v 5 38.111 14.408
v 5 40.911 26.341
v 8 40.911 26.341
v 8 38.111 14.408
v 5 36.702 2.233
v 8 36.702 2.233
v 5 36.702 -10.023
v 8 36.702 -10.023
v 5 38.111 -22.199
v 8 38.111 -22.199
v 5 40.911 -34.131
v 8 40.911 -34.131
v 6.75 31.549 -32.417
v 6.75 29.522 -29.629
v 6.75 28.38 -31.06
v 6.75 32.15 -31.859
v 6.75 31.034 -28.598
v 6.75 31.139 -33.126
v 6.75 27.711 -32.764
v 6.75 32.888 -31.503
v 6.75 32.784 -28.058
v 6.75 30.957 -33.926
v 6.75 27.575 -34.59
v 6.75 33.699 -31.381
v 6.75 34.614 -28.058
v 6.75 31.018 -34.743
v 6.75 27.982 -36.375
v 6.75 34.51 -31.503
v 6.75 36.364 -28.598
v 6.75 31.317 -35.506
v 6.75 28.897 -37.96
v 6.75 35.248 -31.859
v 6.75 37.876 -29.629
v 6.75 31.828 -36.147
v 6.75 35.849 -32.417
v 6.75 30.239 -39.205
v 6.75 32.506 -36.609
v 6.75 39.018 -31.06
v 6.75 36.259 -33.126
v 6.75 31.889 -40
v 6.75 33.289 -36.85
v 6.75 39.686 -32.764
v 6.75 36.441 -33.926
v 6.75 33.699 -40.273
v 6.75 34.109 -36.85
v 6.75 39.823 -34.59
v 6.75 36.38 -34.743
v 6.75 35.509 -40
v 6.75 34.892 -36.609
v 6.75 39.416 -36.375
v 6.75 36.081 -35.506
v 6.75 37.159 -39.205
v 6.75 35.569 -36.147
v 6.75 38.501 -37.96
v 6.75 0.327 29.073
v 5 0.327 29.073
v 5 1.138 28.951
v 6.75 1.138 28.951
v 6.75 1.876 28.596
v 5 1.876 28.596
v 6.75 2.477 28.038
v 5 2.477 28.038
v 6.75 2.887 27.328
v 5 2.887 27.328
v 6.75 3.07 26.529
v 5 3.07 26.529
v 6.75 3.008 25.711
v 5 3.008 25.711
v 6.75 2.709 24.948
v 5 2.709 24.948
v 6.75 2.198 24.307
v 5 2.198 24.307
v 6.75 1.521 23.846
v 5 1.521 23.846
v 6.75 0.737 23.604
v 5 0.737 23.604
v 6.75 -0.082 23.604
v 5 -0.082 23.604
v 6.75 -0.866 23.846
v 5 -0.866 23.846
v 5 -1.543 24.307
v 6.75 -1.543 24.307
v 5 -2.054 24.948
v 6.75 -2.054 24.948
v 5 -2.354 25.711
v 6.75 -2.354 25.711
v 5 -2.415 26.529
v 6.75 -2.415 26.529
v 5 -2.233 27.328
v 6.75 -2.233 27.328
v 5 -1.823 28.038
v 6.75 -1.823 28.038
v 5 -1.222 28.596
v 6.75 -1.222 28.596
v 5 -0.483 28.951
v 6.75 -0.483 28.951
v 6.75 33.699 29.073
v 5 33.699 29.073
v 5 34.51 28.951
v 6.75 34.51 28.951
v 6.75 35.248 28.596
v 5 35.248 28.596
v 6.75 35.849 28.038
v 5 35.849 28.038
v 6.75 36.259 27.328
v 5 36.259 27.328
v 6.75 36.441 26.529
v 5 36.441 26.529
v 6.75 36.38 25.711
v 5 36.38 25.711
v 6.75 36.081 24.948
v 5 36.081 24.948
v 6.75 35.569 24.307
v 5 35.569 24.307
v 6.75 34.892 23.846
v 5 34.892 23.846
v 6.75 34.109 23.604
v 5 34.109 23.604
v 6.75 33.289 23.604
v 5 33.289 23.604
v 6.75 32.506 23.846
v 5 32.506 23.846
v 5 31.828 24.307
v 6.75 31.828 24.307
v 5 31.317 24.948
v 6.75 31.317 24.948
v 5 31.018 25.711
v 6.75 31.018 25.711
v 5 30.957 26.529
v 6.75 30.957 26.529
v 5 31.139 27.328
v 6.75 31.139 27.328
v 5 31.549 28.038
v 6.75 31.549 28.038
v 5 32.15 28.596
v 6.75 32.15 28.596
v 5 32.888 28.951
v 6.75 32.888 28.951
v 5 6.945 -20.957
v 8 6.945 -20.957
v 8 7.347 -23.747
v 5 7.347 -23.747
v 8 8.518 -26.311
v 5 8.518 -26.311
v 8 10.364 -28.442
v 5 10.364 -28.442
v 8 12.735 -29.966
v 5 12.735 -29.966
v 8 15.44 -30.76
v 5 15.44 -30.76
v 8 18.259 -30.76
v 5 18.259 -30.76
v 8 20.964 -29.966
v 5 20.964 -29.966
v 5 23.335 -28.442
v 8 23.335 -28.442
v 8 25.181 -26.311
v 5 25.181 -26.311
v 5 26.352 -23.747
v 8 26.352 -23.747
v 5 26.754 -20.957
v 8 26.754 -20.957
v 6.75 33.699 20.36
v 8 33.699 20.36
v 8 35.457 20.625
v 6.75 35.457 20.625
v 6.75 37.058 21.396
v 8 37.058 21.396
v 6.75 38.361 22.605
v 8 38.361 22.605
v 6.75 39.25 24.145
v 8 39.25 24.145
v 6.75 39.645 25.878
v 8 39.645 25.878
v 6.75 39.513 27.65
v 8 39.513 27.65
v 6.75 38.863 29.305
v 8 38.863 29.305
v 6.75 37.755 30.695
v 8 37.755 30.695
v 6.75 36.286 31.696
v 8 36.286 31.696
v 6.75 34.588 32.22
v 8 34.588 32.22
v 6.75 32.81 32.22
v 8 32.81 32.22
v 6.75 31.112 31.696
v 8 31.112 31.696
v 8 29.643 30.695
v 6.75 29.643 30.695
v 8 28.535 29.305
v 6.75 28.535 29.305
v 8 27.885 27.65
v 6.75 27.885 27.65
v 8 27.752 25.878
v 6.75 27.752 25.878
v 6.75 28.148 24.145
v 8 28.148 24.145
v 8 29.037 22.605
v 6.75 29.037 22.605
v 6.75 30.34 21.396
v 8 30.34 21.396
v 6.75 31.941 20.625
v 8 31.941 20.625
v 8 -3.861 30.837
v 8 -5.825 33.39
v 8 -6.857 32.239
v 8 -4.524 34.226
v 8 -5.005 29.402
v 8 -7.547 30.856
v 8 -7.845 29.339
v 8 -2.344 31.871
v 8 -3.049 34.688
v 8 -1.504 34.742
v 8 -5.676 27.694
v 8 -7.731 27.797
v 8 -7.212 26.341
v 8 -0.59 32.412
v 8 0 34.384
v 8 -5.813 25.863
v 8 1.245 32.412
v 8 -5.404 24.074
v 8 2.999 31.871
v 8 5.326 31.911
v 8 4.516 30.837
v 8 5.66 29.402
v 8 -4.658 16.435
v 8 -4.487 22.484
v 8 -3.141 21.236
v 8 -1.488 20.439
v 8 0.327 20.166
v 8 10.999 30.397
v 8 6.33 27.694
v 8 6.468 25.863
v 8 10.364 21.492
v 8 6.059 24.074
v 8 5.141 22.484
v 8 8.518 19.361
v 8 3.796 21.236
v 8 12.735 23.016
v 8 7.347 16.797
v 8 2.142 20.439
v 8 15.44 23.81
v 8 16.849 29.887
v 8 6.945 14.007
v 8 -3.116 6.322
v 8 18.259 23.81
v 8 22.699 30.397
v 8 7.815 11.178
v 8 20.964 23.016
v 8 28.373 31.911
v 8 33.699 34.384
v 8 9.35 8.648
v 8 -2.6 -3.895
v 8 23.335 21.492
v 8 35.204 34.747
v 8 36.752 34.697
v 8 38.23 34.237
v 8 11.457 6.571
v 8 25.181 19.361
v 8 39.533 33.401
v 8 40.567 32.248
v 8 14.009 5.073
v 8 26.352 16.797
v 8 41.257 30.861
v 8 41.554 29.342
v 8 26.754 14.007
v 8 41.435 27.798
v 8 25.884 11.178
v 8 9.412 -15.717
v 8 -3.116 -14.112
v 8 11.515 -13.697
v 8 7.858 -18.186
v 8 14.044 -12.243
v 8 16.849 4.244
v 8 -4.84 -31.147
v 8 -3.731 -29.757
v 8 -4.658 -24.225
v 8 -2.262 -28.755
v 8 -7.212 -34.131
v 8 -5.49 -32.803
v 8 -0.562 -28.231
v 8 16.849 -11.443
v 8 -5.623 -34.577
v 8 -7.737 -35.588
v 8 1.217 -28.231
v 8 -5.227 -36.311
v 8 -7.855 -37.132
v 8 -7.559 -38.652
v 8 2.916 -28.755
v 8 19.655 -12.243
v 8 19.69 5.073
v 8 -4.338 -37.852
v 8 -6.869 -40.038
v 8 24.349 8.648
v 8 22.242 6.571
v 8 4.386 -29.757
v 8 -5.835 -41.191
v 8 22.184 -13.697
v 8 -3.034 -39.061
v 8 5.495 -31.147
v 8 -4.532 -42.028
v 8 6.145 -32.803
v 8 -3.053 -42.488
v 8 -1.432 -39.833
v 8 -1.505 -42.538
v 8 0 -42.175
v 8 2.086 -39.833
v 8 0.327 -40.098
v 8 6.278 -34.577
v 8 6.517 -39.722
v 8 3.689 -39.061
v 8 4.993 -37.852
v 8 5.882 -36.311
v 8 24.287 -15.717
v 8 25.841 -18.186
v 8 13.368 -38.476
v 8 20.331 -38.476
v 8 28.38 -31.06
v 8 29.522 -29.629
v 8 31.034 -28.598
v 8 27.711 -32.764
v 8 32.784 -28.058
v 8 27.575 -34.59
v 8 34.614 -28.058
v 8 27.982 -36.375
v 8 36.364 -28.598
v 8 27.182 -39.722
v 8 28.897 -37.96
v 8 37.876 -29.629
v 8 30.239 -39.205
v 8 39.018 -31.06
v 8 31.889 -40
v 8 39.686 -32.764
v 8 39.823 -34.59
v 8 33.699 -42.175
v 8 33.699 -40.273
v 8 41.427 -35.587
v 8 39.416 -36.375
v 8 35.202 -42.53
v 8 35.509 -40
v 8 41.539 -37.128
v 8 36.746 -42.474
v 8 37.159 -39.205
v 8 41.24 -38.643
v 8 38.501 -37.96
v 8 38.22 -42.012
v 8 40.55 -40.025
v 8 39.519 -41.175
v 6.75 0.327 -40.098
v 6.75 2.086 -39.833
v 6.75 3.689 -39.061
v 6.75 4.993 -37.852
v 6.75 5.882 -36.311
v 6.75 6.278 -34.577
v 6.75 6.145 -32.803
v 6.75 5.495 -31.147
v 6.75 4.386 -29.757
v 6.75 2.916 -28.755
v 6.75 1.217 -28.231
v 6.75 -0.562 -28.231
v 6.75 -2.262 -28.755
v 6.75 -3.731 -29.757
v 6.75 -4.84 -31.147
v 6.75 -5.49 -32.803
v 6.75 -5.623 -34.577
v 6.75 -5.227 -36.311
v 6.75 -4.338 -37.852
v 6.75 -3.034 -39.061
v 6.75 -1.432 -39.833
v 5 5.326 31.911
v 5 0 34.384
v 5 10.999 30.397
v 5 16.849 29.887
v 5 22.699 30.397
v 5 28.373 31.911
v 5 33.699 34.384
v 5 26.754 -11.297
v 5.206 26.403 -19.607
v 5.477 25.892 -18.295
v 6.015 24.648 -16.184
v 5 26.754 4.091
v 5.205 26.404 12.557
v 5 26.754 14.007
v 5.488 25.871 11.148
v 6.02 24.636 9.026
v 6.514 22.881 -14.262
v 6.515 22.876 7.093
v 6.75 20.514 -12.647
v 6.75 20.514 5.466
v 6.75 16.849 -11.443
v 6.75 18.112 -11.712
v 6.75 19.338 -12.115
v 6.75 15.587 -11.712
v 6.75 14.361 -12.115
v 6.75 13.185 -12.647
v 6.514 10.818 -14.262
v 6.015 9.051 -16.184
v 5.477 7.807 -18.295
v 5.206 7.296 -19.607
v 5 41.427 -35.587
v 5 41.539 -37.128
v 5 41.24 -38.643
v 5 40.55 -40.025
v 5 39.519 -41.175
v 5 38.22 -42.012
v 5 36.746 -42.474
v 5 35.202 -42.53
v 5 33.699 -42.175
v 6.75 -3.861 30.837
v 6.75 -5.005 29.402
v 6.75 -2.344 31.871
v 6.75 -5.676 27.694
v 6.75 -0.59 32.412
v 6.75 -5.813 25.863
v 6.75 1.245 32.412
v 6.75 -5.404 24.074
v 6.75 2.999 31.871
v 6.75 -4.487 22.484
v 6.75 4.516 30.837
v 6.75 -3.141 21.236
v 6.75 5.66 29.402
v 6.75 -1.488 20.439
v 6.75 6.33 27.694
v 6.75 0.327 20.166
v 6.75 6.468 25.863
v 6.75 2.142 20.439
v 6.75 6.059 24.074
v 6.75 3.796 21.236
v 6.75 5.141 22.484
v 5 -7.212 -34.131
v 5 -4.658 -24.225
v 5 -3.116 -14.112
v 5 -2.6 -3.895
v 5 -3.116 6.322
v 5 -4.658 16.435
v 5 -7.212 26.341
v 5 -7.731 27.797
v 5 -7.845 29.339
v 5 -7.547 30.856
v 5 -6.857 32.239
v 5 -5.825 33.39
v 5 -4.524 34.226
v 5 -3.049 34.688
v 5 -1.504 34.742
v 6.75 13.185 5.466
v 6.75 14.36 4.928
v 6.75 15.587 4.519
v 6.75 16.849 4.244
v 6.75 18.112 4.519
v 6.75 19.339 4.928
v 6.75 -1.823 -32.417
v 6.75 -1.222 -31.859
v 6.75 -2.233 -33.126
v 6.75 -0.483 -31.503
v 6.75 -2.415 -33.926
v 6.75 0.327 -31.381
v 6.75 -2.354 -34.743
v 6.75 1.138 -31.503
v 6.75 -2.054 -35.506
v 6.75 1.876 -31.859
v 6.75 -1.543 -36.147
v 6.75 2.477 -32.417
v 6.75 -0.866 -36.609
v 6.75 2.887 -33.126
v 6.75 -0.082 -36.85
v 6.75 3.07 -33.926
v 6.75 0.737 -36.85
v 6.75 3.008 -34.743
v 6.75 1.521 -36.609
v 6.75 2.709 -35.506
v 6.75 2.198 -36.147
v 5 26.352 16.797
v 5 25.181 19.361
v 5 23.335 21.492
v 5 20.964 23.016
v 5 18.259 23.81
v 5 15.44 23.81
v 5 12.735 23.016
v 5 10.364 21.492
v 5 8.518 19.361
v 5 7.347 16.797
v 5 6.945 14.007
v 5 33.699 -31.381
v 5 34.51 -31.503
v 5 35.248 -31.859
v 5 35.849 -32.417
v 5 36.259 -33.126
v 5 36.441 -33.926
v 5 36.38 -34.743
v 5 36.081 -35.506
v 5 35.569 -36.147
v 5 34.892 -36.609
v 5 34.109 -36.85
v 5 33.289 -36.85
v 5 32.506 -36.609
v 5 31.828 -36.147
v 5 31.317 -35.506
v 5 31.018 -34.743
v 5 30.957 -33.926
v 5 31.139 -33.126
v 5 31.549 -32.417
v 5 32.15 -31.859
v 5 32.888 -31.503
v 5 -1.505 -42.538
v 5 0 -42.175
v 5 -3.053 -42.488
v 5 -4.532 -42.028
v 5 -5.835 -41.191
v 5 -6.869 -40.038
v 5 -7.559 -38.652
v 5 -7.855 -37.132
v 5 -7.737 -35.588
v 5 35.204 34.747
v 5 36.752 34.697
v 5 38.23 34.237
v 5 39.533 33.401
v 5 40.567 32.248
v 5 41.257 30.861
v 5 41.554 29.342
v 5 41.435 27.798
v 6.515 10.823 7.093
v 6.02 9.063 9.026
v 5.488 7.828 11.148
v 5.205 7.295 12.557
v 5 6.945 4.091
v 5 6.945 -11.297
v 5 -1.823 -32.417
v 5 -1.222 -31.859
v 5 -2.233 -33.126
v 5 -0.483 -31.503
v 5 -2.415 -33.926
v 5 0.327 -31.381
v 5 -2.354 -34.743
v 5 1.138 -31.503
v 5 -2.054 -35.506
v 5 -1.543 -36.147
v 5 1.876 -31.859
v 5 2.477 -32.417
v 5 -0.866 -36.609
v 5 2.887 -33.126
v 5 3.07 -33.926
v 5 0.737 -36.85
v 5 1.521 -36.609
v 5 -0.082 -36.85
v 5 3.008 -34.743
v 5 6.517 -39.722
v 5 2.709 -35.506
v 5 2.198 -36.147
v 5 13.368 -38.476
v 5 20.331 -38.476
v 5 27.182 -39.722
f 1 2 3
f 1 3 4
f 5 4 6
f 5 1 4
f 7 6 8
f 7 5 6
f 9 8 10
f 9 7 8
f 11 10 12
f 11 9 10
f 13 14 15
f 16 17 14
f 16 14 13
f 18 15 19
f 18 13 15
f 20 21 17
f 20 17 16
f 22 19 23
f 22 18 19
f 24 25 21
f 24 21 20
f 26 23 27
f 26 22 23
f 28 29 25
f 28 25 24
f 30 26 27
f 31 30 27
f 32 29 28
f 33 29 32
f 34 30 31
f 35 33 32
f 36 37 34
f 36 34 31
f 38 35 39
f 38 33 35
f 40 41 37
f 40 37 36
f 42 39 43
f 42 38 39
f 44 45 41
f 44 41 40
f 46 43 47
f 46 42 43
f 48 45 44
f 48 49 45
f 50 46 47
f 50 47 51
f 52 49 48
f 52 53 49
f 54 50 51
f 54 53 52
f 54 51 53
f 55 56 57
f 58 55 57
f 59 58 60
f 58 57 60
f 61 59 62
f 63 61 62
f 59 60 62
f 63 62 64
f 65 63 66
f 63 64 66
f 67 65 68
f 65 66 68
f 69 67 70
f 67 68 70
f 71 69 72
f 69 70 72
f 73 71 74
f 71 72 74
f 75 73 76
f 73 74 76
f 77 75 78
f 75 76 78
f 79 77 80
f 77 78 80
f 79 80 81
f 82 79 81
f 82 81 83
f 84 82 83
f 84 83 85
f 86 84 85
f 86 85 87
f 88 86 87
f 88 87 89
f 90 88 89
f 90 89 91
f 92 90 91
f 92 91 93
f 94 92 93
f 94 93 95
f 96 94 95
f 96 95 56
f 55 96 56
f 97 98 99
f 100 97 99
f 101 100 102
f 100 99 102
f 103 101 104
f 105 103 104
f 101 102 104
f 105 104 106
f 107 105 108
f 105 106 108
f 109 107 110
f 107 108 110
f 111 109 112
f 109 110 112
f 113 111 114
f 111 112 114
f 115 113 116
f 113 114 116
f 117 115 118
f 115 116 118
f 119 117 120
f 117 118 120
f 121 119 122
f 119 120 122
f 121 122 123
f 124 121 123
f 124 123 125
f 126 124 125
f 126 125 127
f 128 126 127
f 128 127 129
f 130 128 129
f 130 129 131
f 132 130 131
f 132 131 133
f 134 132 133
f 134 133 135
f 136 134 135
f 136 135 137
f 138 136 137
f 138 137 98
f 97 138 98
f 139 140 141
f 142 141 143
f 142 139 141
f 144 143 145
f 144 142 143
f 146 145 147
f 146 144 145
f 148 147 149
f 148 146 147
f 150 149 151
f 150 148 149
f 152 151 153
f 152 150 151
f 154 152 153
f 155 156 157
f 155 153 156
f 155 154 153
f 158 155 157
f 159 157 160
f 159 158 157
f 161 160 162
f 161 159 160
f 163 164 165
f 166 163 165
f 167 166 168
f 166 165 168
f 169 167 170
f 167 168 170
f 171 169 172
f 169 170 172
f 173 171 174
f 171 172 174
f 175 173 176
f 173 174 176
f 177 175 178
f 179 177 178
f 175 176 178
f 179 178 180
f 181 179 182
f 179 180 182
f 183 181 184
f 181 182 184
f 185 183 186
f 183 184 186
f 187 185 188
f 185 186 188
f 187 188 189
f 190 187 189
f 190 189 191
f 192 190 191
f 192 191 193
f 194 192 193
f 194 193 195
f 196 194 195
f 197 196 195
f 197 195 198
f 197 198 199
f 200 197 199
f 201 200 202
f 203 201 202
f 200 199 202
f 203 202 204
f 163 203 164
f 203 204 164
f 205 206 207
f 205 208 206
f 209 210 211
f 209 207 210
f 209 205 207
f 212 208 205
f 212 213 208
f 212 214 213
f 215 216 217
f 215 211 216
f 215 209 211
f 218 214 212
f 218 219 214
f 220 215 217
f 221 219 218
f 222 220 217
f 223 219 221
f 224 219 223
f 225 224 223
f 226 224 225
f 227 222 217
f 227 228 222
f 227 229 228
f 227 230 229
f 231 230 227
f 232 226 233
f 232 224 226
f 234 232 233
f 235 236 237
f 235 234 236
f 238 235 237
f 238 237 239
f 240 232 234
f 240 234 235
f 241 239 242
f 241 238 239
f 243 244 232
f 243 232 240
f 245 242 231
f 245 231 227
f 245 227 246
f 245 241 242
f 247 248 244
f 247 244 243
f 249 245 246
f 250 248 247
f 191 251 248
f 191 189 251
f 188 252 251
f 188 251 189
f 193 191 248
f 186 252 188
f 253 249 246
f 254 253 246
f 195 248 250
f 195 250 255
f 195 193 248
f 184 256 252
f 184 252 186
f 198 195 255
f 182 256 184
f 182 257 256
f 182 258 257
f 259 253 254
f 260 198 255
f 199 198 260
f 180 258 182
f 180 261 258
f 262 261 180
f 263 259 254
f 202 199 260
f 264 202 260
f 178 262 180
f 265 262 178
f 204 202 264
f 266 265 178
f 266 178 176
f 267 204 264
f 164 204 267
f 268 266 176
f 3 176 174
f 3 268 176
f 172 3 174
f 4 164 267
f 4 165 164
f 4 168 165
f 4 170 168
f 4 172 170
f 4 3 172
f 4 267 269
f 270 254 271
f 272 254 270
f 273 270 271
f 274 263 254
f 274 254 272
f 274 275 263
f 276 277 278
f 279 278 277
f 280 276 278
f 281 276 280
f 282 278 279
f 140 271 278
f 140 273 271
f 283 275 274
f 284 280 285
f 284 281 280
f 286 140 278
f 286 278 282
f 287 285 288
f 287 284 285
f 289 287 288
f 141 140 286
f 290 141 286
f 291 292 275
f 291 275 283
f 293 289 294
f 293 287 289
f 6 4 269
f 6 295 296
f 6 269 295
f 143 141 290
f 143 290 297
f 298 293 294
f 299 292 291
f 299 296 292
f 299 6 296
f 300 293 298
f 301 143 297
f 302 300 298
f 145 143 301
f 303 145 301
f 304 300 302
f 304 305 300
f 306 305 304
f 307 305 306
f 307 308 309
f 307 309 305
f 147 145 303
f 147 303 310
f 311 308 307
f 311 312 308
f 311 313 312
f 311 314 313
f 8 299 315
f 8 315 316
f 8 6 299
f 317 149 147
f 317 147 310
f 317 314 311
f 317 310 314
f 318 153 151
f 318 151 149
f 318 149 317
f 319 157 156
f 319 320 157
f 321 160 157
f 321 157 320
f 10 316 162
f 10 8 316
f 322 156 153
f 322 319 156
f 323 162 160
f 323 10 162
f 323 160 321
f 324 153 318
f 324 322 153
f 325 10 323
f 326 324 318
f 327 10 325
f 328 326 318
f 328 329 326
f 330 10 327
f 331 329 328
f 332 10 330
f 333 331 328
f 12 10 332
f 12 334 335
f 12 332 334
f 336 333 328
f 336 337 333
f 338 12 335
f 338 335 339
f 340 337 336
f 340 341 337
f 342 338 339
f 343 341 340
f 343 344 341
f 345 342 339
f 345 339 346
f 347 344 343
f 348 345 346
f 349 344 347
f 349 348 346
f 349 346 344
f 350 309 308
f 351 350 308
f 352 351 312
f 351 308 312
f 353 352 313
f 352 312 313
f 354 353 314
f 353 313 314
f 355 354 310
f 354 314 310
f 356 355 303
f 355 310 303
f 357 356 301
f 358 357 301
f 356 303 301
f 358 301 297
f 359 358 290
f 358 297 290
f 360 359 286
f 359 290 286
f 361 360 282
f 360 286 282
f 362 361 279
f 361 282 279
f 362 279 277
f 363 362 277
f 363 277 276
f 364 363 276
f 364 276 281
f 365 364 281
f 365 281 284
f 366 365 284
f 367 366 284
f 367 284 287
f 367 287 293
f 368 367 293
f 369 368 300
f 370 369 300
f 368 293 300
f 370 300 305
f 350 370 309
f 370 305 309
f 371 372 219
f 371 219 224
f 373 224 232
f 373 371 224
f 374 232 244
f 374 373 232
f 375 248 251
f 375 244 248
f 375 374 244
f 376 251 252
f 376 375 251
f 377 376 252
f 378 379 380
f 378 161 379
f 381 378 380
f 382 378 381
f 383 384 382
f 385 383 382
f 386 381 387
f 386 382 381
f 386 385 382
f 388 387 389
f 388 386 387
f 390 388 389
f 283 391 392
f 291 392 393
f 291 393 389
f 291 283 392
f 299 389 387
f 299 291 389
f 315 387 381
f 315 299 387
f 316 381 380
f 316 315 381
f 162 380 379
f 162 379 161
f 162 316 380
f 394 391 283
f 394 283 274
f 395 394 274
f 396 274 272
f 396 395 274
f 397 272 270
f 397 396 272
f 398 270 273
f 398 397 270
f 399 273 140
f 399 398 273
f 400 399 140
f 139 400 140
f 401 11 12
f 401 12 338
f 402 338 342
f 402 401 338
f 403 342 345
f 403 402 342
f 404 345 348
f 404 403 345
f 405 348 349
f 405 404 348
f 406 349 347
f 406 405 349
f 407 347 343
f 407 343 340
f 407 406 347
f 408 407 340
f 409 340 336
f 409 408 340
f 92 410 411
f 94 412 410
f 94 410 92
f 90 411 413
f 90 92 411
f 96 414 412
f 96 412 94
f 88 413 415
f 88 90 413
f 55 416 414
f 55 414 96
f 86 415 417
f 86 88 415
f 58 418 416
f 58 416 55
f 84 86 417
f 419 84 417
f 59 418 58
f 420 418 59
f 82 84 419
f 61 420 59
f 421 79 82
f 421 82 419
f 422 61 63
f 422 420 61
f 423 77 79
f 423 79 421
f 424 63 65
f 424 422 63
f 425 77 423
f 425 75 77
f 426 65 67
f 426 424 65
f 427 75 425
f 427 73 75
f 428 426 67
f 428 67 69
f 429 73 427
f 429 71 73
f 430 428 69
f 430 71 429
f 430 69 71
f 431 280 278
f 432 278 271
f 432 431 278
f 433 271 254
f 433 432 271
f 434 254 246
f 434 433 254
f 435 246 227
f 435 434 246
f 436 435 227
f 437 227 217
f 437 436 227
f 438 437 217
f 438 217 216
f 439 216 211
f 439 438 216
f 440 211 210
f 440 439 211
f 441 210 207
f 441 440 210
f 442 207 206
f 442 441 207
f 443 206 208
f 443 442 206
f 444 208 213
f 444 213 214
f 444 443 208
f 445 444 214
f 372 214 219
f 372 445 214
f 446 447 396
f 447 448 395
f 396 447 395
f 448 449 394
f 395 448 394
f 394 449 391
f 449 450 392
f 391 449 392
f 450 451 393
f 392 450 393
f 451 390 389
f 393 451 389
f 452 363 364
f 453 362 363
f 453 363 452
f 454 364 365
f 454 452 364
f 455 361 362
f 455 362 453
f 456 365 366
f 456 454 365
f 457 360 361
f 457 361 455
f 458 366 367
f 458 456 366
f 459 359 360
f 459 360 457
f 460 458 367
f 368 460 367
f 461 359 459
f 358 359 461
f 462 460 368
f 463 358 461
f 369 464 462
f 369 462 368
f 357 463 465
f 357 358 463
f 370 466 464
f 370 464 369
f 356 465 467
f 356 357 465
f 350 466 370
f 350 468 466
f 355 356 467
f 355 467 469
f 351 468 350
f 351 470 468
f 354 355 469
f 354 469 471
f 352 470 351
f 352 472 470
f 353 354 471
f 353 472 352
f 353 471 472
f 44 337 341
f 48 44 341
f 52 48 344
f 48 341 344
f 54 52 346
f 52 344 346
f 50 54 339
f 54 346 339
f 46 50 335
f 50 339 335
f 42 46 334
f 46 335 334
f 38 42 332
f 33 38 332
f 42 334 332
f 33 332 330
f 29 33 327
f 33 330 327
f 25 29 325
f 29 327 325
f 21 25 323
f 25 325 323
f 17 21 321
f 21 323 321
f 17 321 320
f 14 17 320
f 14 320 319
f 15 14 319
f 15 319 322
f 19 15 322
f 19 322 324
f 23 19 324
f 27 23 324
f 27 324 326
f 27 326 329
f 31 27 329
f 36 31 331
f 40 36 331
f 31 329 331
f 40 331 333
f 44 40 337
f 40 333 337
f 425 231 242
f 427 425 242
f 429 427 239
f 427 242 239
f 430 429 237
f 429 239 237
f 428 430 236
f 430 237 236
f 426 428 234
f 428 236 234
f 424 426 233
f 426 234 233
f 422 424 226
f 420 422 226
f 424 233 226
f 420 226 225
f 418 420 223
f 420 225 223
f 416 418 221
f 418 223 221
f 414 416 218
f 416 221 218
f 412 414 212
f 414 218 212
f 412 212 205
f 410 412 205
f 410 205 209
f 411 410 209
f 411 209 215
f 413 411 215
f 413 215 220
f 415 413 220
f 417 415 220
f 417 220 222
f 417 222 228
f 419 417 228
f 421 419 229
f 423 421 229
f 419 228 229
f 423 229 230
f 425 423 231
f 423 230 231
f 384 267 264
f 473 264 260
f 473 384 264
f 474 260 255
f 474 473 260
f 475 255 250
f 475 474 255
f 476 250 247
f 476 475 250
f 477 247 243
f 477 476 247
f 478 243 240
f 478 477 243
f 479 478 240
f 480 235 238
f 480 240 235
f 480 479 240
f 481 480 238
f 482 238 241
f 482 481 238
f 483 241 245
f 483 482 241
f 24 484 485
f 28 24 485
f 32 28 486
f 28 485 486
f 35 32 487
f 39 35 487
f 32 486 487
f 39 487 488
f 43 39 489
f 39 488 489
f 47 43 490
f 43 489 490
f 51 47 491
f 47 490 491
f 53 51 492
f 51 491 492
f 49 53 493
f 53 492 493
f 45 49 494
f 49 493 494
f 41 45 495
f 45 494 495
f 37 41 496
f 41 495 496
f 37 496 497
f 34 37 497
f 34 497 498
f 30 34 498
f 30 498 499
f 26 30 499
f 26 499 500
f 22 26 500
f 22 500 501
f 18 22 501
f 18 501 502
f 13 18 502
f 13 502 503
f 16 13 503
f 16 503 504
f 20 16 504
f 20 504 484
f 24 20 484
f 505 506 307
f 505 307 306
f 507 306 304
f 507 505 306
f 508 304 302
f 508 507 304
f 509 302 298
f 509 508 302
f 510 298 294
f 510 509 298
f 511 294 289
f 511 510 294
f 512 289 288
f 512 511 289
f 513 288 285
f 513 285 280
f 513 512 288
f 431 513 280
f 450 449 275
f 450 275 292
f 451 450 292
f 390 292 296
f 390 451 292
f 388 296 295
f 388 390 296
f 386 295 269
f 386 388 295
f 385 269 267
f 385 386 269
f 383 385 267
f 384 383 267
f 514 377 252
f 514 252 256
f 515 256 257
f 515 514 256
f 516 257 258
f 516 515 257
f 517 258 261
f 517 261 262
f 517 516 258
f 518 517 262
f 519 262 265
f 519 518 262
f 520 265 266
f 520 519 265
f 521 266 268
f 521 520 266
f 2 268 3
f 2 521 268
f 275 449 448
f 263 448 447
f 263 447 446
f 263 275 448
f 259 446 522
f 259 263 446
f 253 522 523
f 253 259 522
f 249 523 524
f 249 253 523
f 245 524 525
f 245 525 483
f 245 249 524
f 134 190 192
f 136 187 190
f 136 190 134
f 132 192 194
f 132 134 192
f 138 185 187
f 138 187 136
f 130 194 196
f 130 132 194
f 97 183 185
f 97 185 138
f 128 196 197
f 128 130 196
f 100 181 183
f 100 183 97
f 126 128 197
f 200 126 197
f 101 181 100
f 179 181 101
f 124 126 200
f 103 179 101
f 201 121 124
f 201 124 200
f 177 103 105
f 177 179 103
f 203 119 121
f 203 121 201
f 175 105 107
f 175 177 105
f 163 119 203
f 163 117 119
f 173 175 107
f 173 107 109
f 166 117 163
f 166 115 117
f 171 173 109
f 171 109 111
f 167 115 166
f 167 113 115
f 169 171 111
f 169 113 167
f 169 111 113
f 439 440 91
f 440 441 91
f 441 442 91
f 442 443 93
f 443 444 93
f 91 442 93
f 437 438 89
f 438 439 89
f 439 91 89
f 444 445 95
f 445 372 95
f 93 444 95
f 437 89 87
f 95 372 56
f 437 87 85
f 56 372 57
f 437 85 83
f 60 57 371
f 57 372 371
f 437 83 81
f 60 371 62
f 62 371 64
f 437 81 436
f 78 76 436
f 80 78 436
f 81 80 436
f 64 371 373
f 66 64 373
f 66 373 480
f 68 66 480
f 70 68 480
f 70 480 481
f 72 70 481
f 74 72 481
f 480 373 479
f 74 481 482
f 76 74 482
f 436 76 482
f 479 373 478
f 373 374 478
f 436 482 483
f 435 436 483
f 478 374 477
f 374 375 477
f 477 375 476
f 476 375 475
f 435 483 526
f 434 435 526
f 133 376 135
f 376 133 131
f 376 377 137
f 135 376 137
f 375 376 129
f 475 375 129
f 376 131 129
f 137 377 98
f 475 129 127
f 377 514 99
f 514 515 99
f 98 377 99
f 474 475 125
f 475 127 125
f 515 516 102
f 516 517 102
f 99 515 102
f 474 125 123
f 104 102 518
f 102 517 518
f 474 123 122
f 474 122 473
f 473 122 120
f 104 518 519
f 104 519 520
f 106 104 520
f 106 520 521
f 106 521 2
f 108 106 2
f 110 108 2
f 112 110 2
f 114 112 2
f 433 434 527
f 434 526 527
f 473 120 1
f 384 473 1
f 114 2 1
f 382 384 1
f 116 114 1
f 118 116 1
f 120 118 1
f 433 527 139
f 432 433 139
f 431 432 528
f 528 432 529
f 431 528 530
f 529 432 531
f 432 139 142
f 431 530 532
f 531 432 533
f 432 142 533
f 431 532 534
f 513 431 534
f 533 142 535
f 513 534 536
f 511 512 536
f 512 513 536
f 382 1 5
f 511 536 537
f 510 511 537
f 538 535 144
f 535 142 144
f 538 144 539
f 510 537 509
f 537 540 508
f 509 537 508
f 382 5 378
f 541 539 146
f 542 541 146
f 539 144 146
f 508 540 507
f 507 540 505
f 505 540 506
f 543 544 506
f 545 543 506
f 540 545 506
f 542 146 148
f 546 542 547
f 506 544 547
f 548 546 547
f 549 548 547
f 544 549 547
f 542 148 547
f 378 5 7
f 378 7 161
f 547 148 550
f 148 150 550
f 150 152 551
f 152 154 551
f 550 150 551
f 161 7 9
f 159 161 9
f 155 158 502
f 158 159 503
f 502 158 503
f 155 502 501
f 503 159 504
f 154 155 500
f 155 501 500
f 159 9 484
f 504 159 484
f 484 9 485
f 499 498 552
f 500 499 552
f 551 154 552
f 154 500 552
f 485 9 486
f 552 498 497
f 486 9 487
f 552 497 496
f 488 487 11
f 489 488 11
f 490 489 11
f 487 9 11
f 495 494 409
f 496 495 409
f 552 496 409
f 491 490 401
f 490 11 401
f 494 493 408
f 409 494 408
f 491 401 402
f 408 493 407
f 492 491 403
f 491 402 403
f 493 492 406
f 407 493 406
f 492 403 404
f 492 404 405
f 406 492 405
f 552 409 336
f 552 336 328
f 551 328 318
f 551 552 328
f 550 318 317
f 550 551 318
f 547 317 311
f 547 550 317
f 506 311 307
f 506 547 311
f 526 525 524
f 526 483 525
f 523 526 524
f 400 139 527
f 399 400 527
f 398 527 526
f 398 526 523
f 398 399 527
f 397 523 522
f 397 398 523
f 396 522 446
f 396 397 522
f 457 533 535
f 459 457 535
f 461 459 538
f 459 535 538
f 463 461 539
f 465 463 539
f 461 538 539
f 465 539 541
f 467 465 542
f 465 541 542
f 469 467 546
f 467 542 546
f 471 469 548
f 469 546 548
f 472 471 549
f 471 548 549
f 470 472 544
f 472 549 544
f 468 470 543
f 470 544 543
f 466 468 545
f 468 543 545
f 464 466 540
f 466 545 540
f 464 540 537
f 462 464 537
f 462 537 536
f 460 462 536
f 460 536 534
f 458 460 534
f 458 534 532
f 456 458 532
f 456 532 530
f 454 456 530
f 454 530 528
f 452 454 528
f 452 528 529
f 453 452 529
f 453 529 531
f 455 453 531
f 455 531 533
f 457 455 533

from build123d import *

# Parameters (mm, degrees)
SKETCH_1_W          = 87
SKETCH_1_H          = 63
SKETCH_1_W_2        = 83
SKETCH_1_H_2        = 59
EXTRUDE_1_DEPTH     = 5
SKETCH_2_W          = 87
SKETCH_2_H          = 63
EXTRUDE_2_DEPTH     = 3
SKETCH_3_W          = 2.764626384
SKETCH_3_H          = 4.6515936
CUT_EXTRUDE_1_DEPTH = 2
FILLET_1_R          = 2
SKETCH_5_R          = 2.75
CUT_EXTRUDE_2_DEPTH = 10
SKETCH_6_OUTSIDE_W  = 110.542
SKETCH_6_OUTSIDE_H  = 86.542
CUT_EXTRUDE_3_DEPTH = 10
SKETCH_7_W          = 10.763963746
SKETCH_7_H          = 73.165580881
CUT_EXTRUDE_4_DEPTH = 125
SKETCH_8_R          = 5.963187944
SKETCH_8_R_2        = 6.141451549
SKETCH_8_R_3        = 6.157472201
SKETCH_8_R_4        = 5.967235868
CUT_EXTRUDE_5_DEPTH = 1.25
SKETCH_9_W          = 15.387789175
SKETCH_9_H          = 31.944271198
EXTRUDE_4_DEPTH     = 1.25
FILLET_2_R          = 12


with BuildPart() as part:
    # 草图1 → 凸台-拉伸1 (new body)
    with BuildSketch(Plane(origin=(0, 0, 0), x_dir=(0, 0, -1), z_dir=(1, 0, 0))):
        with Locations((3.90387463, 17.013155975)):
            Rectangle(SKETCH_1_W, SKETCH_1_H)
        with Locations((3.90387463, 17.013155975)):
            Rectangle(SKETCH_1_W_2, SKETCH_1_H_2, mode=Mode.SUBTRACT)
    extrude(amount=EXTRUDE_1_DEPTH)

    # 草图2 → 凸台-拉伸2 (add)
    with BuildSketch(Plane(origin=(5, 0, 0), x_dir=(0, 0, -1), z_dir=(1, 0, 0))):
        with Locations((3.90387463, 17.013155975)):
            Rectangle(SKETCH_2_W, SKETCH_2_H)
    extrude(amount=EXTRUDE_2_DEPTH)

    # 草图3 → 切除-拉伸1 (cut)
    with BuildSketch(Plane(origin=(0, 0, -47.40387463), x_dir=(-1, 0, 0), z_dir=(0, 0, -1))):
        with Locations((-3.662779601, -6.806448474)):
            Rectangle(SKETCH_3_W, SKETCH_3_H)
    extrude(amount=-CUT_EXTRUDE_1_DEPTH, mode=Mode.SUBTRACT)

    # 圆角1
    fillet_1_edges = [part.edges().sort_by_distance(p)[0] for p in [
        (8, 17.013155975, 39.59612537),
        (8, -14.486844025, -3.90387463),
        (8, 17.013155975, -47.40387463),
        (8, 48.513155975, -3.90387463),
        (4, 48.513155975, 39.59612537),
        (4, 48.513155975, -47.40387463),
        (4, -14.486844025, -47.40387463),
        (4, -14.486844025, 39.59612537),
    ]]
    fillet(fillet_1_edges, radius=FILLET_1_R)

    # 草图5 → 切除-拉伸2 (cut)
    with BuildSketch(Plane.ZY.offset(-5)):
        with Locations((-34.13110136, 33.698944985)):
            Circle(SKETCH_5_R)
        with Locations((26.3233521, 33.698944985)):
            Circle(SKETCH_5_R)
        with Locations((-34.13110136, 0.327366965)):
            Circle(SKETCH_5_R)
        with Locations((26.3233521, 0.327366965)):
            Circle(SKETCH_5_R)
    extrude(amount=-CUT_EXTRUDE_2_DEPTH, mode=Mode.SUBTRACT)

    # 草图6 outside → 切除-拉伸3 (cut)
    # profile 1 of 2: a face of its own
    with BuildSketch(Plane.ZY.offset(-5)):
        with Locations((-3.904, 17.013)):
            Rectangle(SKETCH_6_OUTSIDE_W, SKETCH_6_OUTSIDE_H)
        with BuildLine():
            ThreePointArc((-42.174874453, 33.698944985), (-38.319014018, 16.849472493), (-42.174874453, 0))
            ThreePointArc((-42.174874453, 0), (-40.649791206, -6.390726624), (-34.13110136, -7.211670209))
            ThreePointArc((-34.13110136, -7.211670209), (-3.895194581, -2.599840712), (26.340712199, -7.211670209))
            ThreePointArc((26.340712199, -7.211670209), (32.84921876, -6.379368362), (34.384485291, 0))
            ThreePointArc((34.384485291, 0), (29.88694456, 16.849472493), (34.384485291, 33.698944985))
            ThreePointArc((34.384485291, 33.698944985), (32.858946784, 40.089163818), (26.340712199, 40.910615194))
            ThreePointArc((26.340712199, 40.910615194), (-3.895194581, 36.525010702), (-34.13110136, 40.910615194))
            ThreePointArc((-34.13110136, 40.910615194), (-40.634931957, 40.073097857), (-42.174874453, 33.698944985))
        make_face(mode=Mode.SUBTRACT)
    # profile 2 of 2: a face of its own
    with BuildSketch(Plane.ZY.offset(-5)):
        with BuildLine():
            Line((-20.956673586, 26.753574551), (14.00692679, 26.753574551))
            ThreePointArc((14.00692679, 26.753574551), (23.911028849, 16.849472493), (14.00692679, 6.945370434))
            Line((14.00692679, 6.945370434), (-20.956673586, 6.945370434))
            ThreePointArc((-20.956673586, 6.945370434), (-30.860775645, 16.849472493), (-20.956673586, 26.753574551))
        make_face()
    extrude(amount=-CUT_EXTRUDE_3_DEPTH, mode=Mode.SUBTRACT)


with BuildPart() as cut_extrude_3_piece_1:
    # of the separate pieces the step leaves, piece 1, a body of its own (cut_extrude_3_pieces)
    add(part.part.solids().sort_by_distance((5, 33.698944985, 34.384485291))[0])

    # 草图8 → 切除-拉伸5 (cut)
    with BuildSketch(Plane(origin=(8, 0, 0), x_dir=(0, 0, -1), z_dir=(1, 0, 0))):
        with Locations((-26.3233521, 33.698944985)):
            Circle(SKETCH_8_R)
        with Locations((34.13110136, 33.698944985)):
            Circle(SKETCH_8_R_2)
        with Locations((-26.3233521, 0.327366965)):
            Circle(SKETCH_8_R_3)
        with Locations((34.13110136, 0.327366965)):
            Circle(SKETCH_8_R_4)
    extrude(amount=-CUT_EXTRUDE_5_DEPTH, mode=Mode.SUBTRACT)

    # 草图9 → 凸台-拉伸4 (add)
    with BuildSketch(Plane(origin=(8, 0, 0), x_dir=(0, 0, -1), z_dir=(1, 0, 0))):
        with Locations((3.60318744, 17.051189704)):
            Rectangle(SKETCH_9_W, SKETCH_9_H)
    extrude(amount=-EXTRUDE_4_DEPTH)

    # 圆角2
    # the kernel refuses this fillet: 12 mm, written as the material it adds along each edge
    with BuildSketch(Plane(origin=(6.75, 26.753574551, 4.090707148), x_dir=(-1, 0, 0), z_dir=(0, 0, -1)), Plane(origin=(6.75, 6.945370434, -11.297082027), x_dir=(-1, 0, 0), z_dir=(0, 0, 1))) as fillet_2_piece_1:
        with BuildLine():
            CenterArc((12, -6.239991987), FILLET_2_R, 148.667793293, 31.332206707)
            Line((0, -6.239991987), (-0.24, -6.239991987))
            Line((-0.24, -6.239991987), (-0.24, 0))
            Line((-0.24, 0), (0, 0.24))
            ThreePointArc((0, 0.24), (0.875, 0.24), (1.545, 0.12479984))
            Line((1.545, 0.12479984), (1.75, 0))
        make_face()
    extrude(amount=15.387789175)
    with BuildSketch(Plane(origin=(6.75, 6.945370434, -11.297082027), x_dir=(0, 0, -1), z_dir=(1, 0, 0)), Plane(origin=(8, 26.753574551, -11.297082027), x_dir=(0, 0, -1), z_dir=(-1, 0, 0))) as fillet_2_piece_2:
        with BuildLine():
            CenterArc((12, 11.769557695), FILLET_2_R, 180, 78.753288074)
            Line((0, 11.769557695), (-0.24, 11.769557695))
            Line((-0.24, 11.769557695), (-0.24, 0))
            Line((-0.24, 0), (0, -0.24))
            ThreePointArc((0, -0.24), (4.82979578, -0.24), (9.612783391, -0.235391154))
            Line((9.612783391, -0.235391154), (9.65959156, 0))
        make_face()
    extrude(amount=1.25)
    with BuildSketch(Plane(origin=(8, 6.945370434, 4.090707148), x_dir=(0, 0, 1), z_dir=(-1, 0, 0)), Plane(origin=(6.75, 26.753574551, 4.090707148), x_dir=(0, 0, 1), z_dir=(1, 0, 0))) as fillet_2_piece_3:
        with BuildLine():
            CenterArc((12, 11.817692644), FILLET_2_R, 180, 79.999989207)
            Line((0, 11.817692644), (-0.24, 11.817692644))
            Line((-0.24, 11.817692644), (-0.24, 0))
            Line((-0.24, 0), (0, -0.24))
            ThreePointArc((0, -0.24), (4.958109821, -0.24), (9.874544035, -0.236353853))
            Line((9.874544035, -0.236353853), (9.916219642, 0))
        make_face()
    extrude(amount=1.25)
    with BuildSketch(Plane(origin=(-22.794231609, 26.753574551, 4.090707148), x_dir=(0, 0, 1), z_dir=(1, 0, 0))) as fillet_2_piece_4a_section:
        with BuildLine():
            CenterArc((12, 11.817692644), FILLET_2_R, 180, 79.999989207)
            Line((0, 11.817692644), (-0.24, 11.817692644))
            Line((-0.24, 11.817692644), (-0.24, 0))
            Line((-0.24, 0), (0, -0.24))
            ThreePointArc((0, -0.24), (4.958109821, -0.24), (9.874544035, -0.236353853))
            Line((9.874544035, -0.236353853), (9.916219642, 0))
        make_face()
    fillet_2_piece_4a = extrude(amount=30.794231609, mode=Mode.PRIVATE)
    fillet_2_piece_4a = split(fillet_2_piece_4a, bisect_by=Plane(origin=(5, 26.753574551, 4.090707148), z_dir=(1, 0, 0)), keep=Keep.TOP, mode=Mode.PRIVATE)
    fillet_2_piece_4a = split(fillet_2_piece_4a, bisect_by=Plane(origin=(6.75, 26.753574551, 4.090707148), z_dir=(-1, 0, 0)), keep=Keep.TOP, mode=Mode.PRIVATE)
    with BuildSketch(Plane(origin=(6.75, 26.753574551, 19.690687116), x_dir=(-1, 0, 0), z_dir=(0, 0, -1))) as fillet_2_piece_4b_section:
        with BuildLine():
            CenterArc((12, -6.239991987), FILLET_2_R, 148.667793293, 31.332206707)
            Line((0, -6.239991987), (-0.24, -6.239991987))
            Line((-0.24, -6.239991987), (-0.24, 0))
            Line((-0.24, 0), (0, 0.24))
            ThreePointArc((0, 0.24), (0.875, 0.24), (1.545, 0.12479984))
            Line((1.545, 0.12479984), (1.75, 0))
        make_face()
    fillet_2_piece_4b = extrude(amount=30.987769142, mode=Mode.PRIVATE)
    fillet_2_piece_4b = split(fillet_2_piece_4b, bisect_by=Plane(origin=(6.75, 26.753574551, 4.090707148), z_dir=(0, 0, 1)), keep=Keep.TOP, mode=Mode.PRIVATE)
    fillet_2_piece_4 = fillet_2_piece_4a & fillet_2_piece_4b
    add(fillet_2_piece_4)
    with BuildSketch(Plane(origin=(6.75, 26.753574551, 4.090707148), x_dir=(-1, 0, 0), z_dir=(0, 0, -1))) as fillet_2_piece_5a_section:
        with BuildLine():
            CenterArc((12, -6.239991987), FILLET_2_R, 148.667793293, 31.332206707)
            Line((0, -6.239991987), (-0.24, -6.239991987))
            Line((-0.24, -6.239991987), (-0.24, 0))
            Line((-0.24, 0), (0, 0.24))
            ThreePointArc((0, 0.24), (0.875, 0.24), (1.545, 0.12479984))
            Line((1.545, 0.12479984), (1.75, 0))
        make_face()
    fillet_2_piece_5a = extrude(amount=30.987769142, mode=Mode.PRIVATE)
    fillet_2_piece_5a = split(fillet_2_piece_5a, bisect_by=Plane(origin=(6.75, 26.753574551, -11.297082027), z_dir=(0, 0, -1)), keep=Keep.TOP, mode=Mode.PRIVATE)
    with BuildSketch(Plane(origin=(8, 26.753574551, -11.297082027), x_dir=(0, 0, -1), z_dir=(-1, 0, 0))) as fillet_2_piece_5b_section:
        with BuildLine():
            CenterArc((12, 11.769557695), FILLET_2_R, 180, 78.753288074)
            Line((0, 11.769557695), (-0.24, 11.769557695))
            Line((-0.24, 11.769557695), (-0.24, 0))
            Line((-0.24, 0), (0, -0.24))
            ThreePointArc((0, -0.24), (4.82979578, -0.24), (9.612783391, -0.235391154))
            Line((9.612783391, -0.235391154), (9.65959156, 0))
        make_face()
    fillet_2_piece_5b = extrude(amount=30.673894237, mode=Mode.PRIVATE)
    fillet_2_piece_5b = split(fillet_2_piece_5b, bisect_by=Plane(origin=(5, 26.753574551, -11.297082027), z_dir=(1, 0, 0)), keep=Keep.TOP, mode=Mode.PRIVATE)
    fillet_2_piece_5b = split(fillet_2_piece_5b, bisect_by=Plane(origin=(6.75, 26.753574551, -11.297082027), z_dir=(-1, 0, 0)), keep=Keep.TOP, mode=Mode.PRIVATE)
    fillet_2_piece_5 = fillet_2_piece_5a & fillet_2_piece_5b
    add(fillet_2_piece_5)
    with BuildSketch(Plane(origin=(-22.673894237, 6.945370434, -11.297082027), x_dir=(0, 0, -1), z_dir=(1, 0, 0))) as fillet_2_piece_6a_section:
        with BuildLine():
            CenterArc((12, 11.769557695), FILLET_2_R, 180, 78.753288074)
            Line((0, 11.769557695), (-0.24, 11.769557695))
            Line((-0.24, 11.769557695), (-0.24, 0))
            Line((-0.24, 0), (0, -0.24))
            ThreePointArc((0, -0.24), (4.82979578, -0.24), (9.612783391, -0.235391154))
            Line((9.612783391, -0.235391154), (9.65959156, 0))
        make_face()
    fillet_2_piece_6a = extrude(amount=30.673894237, mode=Mode.PRIVATE)
    fillet_2_piece_6a = split(fillet_2_piece_6a, bisect_by=Plane(origin=(5, 6.945370434, -11.297082027), z_dir=(1, 0, 0)), keep=Keep.TOP, mode=Mode.PRIVATE)
    fillet_2_piece_6a = split(fillet_2_piece_6a, bisect_by=Plane(origin=(6.75, 6.945370434, -11.297082027), z_dir=(-1, 0, 0)), keep=Keep.TOP, mode=Mode.PRIVATE)
    with BuildSketch(Plane(origin=(6.75, 6.945370434, -26.897061994), x_dir=(-1, 0, 0), z_dir=(0, 0, 1))) as fillet_2_piece_6b_section:
        with BuildLine():
            CenterArc((12, -6.239991987), FILLET_2_R, 148.667793293, 31.332206707)
            Line((0, -6.239991987), (-0.24, -6.239991987))
            Line((-0.24, -6.239991987), (-0.24, 0))
            Line((-0.24, 0), (0, 0.24))
            ThreePointArc((0, 0.24), (0.875, 0.24), (1.545, 0.12479984))
            Line((1.545, 0.12479984), (1.75, 0))
        make_face()
    fillet_2_piece_6b = extrude(amount=30.987769142, mode=Mode.PRIVATE)
    fillet_2_piece_6b = split(fillet_2_piece_6b, bisect_by=Plane(origin=(6.75, 6.945370434, -11.297082027), z_dir=(0, 0, -1)), keep=Keep.TOP, mode=Mode.PRIVATE)
    fillet_2_piece_6 = fillet_2_piece_6a & fillet_2_piece_6b
    add(fillet_2_piece_6)
    with BuildSketch(Plane(origin=(6.75, 6.945370434, -11.297082027), x_dir=(-1, 0, 0), z_dir=(0, 0, 1))) as fillet_2_piece_7a_section:
        with BuildLine():
            CenterArc((12, -6.239991987), FILLET_2_R, 148.667793293, 31.332206707)
            Line((0, -6.239991987), (-0.24, -6.239991987))
            Line((-0.24, -6.239991987), (-0.24, 0))
            Line((-0.24, 0), (0, 0.24))
            ThreePointArc((0, 0.24), (0.875, 0.24), (1.545, 0.12479984))
            Line((1.545, 0.12479984), (1.75, 0))
        make_face()
    fillet_2_piece_7a = extrude(amount=30.987769142, mode=Mode.PRIVATE)
    fillet_2_piece_7a = split(fillet_2_piece_7a, bisect_by=Plane(origin=(6.75, 6.945370434, 4.090707148), z_dir=(0, 0, 1)), keep=Keep.TOP, mode=Mode.PRIVATE)
    with BuildSketch(Plane(origin=(8, 6.945370434, 4.090707148), x_dir=(0, 0, 1), z_dir=(-1, 0, 0))) as fillet_2_piece_7b_section:
        with BuildLine():
            CenterArc((12, 11.817692644), FILLET_2_R, 180, 79.999989207)
            Line((0, 11.817692644), (-0.24, 11.817692644))
            Line((-0.24, 11.817692644), (-0.24, 0))
            Line((-0.24, 0), (0, -0.24))
            ThreePointArc((0, -0.24), (4.958109821, -0.24), (9.874544035, -0.236353853))
            Line((9.874544035, -0.236353853), (9.916219642, 0))
        make_face()
    fillet_2_piece_7b = extrude(amount=30.794231609, mode=Mode.PRIVATE)
    fillet_2_piece_7b = split(fillet_2_piece_7b, bisect_by=Plane(origin=(5, 6.945370434, 4.090707148), z_dir=(1, 0, 0)), keep=Keep.TOP, mode=Mode.PRIVATE)
    fillet_2_piece_7b = split(fillet_2_piece_7b, bisect_by=Plane(origin=(6.75, 6.945370434, 4.090707148), z_dir=(-1, 0, 0)), keep=Keep.TOP, mode=Mode.PRIVATE)
    fillet_2_piece_7 = fillet_2_piece_7a & fillet_2_piece_7b
    add(fillet_2_piece_7)


with BuildPart() as cut_extrude_3_piece_2:
    # of the separate pieces the step leaves, piece 2, a body of its own (cut_extrude_3_pieces)
    add(part.part.solids().sort_by_distance((0, 48.513155975, 37.59612537))[0])

    # 草图7 → 切除-拉伸4 (cut)
    with BuildSketch(Plane(origin=(0, 0, -47.40387463), x_dir=(-1, 0, 0), z_dir=(0, 0, -1))):
        with Locations((0.381981873, 14.788439085)):
            Rectangle(SKETCH_7_W, SKETCH_7_H)
    extrude(amount=-CUT_EXTRUDE_4_DEPTH, mode=Mode.SUBTRACT)


solid = cut_extrude_3_piece_1.part
